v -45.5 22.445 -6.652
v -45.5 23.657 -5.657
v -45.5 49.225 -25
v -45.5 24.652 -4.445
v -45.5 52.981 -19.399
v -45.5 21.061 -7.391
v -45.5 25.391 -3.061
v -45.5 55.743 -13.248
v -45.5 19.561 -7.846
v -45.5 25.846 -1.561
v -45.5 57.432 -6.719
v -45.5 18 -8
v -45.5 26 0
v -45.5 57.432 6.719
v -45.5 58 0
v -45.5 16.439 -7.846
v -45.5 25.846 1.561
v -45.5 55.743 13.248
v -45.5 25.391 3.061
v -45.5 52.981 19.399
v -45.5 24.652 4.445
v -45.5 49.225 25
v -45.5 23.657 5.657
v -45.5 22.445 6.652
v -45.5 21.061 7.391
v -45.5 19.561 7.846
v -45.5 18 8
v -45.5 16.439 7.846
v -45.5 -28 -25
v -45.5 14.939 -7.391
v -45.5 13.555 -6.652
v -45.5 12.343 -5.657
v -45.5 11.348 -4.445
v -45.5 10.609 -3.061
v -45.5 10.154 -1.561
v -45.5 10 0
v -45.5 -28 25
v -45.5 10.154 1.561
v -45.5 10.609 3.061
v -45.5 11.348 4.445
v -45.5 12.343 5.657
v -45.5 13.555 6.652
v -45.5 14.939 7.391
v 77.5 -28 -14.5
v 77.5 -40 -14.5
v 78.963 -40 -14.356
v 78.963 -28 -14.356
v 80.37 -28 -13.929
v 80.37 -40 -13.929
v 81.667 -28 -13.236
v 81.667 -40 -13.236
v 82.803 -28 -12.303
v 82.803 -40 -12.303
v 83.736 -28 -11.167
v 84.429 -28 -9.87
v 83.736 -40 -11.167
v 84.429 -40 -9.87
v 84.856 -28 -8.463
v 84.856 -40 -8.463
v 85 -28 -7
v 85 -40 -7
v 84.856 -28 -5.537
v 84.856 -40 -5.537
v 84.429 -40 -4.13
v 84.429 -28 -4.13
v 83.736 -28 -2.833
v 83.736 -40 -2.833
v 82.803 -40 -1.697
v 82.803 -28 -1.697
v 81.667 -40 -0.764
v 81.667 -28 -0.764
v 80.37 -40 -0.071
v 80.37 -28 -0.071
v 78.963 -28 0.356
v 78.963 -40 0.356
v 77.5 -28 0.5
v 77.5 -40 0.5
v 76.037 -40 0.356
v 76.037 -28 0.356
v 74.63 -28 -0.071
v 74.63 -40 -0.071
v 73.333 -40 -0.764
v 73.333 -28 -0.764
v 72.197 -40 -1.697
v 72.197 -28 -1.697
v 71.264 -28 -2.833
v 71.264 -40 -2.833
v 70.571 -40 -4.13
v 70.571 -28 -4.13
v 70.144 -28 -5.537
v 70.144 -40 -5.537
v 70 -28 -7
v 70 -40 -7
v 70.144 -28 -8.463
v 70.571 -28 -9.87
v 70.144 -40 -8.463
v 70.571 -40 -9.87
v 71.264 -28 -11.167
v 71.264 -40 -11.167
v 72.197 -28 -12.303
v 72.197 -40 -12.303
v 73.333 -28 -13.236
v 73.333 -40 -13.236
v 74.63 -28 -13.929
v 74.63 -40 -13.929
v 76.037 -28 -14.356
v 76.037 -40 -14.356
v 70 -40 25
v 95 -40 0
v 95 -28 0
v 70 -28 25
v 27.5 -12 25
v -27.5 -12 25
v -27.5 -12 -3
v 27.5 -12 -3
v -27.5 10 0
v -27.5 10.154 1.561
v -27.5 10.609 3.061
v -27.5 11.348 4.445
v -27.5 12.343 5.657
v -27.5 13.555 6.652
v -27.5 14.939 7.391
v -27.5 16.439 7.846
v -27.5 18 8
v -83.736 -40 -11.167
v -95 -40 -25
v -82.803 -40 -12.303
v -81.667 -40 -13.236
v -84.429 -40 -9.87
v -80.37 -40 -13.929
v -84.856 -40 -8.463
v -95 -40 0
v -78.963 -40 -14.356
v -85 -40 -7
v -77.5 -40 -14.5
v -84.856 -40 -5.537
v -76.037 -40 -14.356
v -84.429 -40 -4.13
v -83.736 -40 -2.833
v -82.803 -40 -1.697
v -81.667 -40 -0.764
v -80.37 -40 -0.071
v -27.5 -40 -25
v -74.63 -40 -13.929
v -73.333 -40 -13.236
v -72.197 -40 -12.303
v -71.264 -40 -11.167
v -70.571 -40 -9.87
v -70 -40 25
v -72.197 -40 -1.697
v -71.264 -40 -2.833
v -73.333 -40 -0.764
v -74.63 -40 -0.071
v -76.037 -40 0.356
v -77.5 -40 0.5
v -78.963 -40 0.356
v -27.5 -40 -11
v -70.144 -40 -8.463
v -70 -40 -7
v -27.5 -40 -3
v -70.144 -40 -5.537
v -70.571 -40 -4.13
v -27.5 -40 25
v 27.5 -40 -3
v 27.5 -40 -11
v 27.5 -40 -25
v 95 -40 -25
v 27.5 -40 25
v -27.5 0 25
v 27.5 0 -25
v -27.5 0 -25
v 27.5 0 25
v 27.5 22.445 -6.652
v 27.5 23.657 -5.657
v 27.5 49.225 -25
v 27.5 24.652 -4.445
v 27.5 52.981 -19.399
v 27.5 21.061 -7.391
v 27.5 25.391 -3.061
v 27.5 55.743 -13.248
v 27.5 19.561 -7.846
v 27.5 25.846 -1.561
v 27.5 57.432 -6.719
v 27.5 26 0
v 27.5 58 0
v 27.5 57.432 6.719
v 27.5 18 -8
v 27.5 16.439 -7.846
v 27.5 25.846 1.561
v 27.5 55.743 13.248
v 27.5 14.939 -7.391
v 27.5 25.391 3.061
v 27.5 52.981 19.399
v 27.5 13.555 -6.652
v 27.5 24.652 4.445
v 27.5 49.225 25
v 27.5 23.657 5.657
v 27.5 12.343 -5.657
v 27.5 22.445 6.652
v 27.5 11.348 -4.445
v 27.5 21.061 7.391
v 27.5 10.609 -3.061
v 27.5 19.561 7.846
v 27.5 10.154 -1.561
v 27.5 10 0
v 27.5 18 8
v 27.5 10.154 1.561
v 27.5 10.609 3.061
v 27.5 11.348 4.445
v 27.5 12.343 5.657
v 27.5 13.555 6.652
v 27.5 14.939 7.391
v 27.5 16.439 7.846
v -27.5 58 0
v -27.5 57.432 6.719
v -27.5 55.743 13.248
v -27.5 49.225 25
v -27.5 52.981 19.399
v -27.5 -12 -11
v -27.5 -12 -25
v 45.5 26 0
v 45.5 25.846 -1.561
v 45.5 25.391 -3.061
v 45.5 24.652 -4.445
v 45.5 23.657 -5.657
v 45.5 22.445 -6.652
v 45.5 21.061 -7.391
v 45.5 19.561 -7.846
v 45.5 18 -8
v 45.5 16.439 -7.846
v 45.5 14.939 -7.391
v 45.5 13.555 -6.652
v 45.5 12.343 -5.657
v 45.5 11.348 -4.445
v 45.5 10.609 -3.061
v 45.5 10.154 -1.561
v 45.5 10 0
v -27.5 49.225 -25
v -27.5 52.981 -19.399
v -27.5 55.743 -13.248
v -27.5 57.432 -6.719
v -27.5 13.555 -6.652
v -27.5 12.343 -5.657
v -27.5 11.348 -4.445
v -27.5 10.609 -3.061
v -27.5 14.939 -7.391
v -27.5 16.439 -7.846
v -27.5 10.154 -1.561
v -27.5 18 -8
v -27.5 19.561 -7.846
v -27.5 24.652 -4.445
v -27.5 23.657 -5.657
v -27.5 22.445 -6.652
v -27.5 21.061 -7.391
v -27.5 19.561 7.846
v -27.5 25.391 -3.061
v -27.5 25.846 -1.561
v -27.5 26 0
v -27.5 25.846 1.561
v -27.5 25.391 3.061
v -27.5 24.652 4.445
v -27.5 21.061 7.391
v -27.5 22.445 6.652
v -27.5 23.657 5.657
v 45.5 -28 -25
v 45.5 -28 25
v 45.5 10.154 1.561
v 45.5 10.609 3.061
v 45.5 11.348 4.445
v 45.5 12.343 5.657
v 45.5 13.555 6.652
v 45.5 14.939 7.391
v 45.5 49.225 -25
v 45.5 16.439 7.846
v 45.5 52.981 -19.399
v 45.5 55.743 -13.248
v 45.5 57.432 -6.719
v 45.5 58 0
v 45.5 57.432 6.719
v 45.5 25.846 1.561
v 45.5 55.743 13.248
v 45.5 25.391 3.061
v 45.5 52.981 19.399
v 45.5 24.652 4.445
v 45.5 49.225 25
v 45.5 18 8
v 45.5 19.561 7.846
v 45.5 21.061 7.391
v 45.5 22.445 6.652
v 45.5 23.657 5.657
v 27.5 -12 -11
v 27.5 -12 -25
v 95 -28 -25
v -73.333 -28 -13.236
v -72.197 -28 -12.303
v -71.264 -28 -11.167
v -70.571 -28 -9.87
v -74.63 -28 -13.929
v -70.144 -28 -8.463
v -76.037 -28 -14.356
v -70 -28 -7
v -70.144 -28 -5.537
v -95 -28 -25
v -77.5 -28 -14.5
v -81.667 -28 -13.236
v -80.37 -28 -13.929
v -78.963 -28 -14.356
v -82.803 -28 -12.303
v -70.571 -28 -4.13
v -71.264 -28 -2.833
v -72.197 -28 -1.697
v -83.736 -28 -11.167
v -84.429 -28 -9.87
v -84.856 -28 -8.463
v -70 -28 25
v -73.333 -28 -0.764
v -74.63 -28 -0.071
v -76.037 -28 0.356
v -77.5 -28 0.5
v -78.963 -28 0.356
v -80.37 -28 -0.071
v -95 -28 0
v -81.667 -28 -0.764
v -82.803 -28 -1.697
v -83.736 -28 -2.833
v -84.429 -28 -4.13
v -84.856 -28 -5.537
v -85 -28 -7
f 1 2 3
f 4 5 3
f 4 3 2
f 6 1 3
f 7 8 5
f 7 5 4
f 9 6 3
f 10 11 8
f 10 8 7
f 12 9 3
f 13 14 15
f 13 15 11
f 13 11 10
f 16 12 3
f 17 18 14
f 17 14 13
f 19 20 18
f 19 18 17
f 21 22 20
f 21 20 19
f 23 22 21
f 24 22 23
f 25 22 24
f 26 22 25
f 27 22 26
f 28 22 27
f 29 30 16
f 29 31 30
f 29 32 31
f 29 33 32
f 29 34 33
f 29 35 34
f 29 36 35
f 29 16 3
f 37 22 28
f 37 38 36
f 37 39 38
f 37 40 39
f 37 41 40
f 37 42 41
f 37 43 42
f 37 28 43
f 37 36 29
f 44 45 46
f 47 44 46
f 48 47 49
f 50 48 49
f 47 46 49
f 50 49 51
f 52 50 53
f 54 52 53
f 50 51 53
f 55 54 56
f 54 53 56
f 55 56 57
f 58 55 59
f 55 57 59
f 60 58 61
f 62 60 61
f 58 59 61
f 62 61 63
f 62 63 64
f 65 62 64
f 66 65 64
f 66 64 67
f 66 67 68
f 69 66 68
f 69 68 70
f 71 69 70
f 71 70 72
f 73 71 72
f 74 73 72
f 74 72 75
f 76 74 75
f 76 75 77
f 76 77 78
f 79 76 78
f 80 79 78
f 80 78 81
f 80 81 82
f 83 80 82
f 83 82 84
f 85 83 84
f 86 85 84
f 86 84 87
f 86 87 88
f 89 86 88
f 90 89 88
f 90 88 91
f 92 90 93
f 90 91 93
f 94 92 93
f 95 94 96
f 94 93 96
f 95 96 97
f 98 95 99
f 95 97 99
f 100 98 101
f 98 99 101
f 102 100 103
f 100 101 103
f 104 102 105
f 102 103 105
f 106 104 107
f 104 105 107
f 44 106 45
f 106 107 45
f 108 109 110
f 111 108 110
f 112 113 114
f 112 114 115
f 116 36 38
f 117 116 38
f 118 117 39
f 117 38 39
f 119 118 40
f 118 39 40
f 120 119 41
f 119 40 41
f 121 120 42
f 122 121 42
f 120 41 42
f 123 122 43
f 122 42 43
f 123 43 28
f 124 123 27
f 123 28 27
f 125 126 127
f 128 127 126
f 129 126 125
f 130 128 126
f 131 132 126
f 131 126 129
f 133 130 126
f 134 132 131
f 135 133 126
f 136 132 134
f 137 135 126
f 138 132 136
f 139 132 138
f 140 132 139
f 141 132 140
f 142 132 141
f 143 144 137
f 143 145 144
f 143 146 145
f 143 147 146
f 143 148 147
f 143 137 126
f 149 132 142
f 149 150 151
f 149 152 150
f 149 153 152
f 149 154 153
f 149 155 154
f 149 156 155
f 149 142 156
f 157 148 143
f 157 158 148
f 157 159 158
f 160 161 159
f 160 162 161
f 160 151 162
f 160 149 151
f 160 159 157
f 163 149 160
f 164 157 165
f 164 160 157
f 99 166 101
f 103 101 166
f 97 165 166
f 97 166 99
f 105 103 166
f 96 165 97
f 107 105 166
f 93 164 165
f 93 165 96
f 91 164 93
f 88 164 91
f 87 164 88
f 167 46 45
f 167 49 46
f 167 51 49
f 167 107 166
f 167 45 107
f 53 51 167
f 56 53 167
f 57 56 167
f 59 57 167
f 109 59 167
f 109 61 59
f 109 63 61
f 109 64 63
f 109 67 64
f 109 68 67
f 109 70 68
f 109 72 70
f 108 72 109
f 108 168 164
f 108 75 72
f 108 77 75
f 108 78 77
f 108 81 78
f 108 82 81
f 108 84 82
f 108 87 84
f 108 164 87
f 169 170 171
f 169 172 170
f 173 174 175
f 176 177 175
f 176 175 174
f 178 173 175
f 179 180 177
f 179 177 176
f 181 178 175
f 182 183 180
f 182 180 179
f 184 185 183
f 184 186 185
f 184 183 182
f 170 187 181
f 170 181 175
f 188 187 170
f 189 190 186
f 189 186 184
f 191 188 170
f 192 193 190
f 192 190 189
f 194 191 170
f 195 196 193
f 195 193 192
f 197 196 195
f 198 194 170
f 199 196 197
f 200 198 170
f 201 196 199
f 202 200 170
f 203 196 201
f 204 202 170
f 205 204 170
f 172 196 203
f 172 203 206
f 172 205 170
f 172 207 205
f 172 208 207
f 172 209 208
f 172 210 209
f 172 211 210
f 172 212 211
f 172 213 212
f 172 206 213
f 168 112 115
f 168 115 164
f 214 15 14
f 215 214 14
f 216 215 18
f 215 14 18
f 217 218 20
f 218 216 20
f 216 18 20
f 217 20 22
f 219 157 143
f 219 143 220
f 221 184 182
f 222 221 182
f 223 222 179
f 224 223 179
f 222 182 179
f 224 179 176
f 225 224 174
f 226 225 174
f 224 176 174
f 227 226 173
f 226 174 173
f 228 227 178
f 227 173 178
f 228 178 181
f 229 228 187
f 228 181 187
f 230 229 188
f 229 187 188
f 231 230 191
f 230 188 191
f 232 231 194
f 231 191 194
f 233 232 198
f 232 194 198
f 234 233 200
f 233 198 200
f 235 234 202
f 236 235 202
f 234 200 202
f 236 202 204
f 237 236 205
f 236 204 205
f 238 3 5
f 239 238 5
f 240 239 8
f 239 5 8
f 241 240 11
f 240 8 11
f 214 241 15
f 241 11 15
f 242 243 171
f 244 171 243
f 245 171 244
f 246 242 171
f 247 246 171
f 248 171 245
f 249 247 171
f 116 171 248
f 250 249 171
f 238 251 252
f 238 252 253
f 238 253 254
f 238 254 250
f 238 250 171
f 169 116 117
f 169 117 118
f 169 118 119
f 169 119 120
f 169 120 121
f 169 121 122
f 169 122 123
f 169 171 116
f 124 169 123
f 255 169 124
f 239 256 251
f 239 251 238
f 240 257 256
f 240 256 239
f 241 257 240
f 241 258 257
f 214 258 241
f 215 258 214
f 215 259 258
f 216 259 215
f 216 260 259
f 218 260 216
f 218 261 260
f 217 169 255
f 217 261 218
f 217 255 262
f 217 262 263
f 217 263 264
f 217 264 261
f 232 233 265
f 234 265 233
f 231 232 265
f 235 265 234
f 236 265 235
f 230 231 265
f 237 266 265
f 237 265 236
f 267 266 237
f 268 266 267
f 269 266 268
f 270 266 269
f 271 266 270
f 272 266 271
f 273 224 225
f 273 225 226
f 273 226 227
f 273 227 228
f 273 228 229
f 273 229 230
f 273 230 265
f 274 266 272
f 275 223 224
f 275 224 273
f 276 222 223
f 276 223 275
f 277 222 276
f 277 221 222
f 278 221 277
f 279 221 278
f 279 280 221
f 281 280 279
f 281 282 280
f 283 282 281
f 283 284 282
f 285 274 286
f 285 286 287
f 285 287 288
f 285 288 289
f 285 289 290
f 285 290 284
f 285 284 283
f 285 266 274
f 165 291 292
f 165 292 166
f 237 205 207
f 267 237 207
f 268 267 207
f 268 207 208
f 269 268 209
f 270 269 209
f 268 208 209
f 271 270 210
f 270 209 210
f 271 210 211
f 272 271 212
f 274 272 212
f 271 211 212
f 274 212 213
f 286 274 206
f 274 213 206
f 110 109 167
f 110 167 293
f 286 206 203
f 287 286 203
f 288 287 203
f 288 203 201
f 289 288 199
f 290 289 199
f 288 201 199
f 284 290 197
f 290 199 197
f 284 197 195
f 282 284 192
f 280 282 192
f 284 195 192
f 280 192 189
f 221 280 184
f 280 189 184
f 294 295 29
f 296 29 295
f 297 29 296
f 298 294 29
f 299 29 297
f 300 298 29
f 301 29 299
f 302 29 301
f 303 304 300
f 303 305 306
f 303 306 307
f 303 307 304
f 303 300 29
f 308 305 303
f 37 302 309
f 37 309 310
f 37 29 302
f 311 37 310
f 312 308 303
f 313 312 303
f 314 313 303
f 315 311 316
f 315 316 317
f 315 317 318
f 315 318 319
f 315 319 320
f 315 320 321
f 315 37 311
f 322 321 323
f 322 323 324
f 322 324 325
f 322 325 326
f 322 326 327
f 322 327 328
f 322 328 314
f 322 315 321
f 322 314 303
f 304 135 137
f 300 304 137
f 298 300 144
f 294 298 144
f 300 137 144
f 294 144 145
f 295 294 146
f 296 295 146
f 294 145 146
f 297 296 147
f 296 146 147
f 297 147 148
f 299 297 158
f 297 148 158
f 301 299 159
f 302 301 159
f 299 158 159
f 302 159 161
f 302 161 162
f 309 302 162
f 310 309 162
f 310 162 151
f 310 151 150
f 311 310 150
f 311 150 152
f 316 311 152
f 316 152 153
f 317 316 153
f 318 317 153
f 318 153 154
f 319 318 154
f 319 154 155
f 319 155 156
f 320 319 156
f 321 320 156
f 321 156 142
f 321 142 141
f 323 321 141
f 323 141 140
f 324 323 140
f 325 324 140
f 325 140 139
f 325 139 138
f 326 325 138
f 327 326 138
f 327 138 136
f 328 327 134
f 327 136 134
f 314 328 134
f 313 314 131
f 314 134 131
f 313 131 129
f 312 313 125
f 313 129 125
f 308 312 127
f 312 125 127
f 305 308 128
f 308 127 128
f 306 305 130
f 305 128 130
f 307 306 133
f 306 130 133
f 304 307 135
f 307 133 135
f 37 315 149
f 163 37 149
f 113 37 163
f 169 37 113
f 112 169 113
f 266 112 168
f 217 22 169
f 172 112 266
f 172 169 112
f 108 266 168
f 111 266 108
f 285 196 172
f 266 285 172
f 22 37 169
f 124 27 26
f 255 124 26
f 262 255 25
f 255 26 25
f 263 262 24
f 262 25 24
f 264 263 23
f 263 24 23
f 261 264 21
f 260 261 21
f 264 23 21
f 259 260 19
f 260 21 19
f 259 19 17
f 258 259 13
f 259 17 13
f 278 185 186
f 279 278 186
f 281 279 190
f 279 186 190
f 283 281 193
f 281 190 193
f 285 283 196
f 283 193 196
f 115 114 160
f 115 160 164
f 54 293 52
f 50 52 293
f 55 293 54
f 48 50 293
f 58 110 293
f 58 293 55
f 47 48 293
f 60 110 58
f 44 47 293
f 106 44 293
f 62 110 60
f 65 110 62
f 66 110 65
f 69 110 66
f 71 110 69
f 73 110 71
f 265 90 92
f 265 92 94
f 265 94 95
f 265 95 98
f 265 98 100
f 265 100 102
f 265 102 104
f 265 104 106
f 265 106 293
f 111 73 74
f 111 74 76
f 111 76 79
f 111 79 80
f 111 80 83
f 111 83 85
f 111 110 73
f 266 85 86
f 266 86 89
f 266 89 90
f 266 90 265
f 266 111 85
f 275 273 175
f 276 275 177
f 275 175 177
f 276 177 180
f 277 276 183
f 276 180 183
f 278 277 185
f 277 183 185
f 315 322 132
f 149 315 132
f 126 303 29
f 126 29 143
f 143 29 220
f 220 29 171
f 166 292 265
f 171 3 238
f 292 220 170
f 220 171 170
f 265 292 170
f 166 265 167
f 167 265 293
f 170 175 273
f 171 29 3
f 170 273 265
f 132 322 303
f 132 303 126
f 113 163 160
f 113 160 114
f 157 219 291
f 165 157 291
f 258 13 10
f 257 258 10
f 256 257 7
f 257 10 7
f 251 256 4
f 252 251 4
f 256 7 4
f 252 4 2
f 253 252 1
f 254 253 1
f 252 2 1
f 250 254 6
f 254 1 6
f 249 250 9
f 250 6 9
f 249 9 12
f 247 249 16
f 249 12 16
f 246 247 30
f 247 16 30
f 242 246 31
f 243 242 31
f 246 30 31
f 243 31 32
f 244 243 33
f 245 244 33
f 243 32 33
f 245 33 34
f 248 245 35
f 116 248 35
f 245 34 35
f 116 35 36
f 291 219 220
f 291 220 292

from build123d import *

# Parameters (mm, degrees)
BOSS_EXTRUDE1_DEPTH = 25
RIB1_START          = -28
RIB1_OUTLINE_W      = 55
RIB1_OUTLINE_H      = 8
RIB1_DEPTH          = 28
CUT_EXTRUDE1_DEPTH  = 100
SKETCH2_5_R         = 7.5
CUT_EXTRUDE2_DEPTH  = 20
CHAMFER2_SIZE       = 25


# Read off the part's stored shape, not the designer's step: Rib1
with BuildPart() as part:
    # Sketch1 → Boss-Extrude1 (new, symmetric)
    with BuildSketch(Plane.XY):
        Polygon((27.5, 0), (0, 0), (0, -12), (27.5, -12), (27.5, -40), (95, -40), (95, -28), (45.5, -28), (45.5, 58), (27.5, 58), align=None)
        Polygon((0, -12), (0, 0), (-27.5, 0), (-27.5, 58), (-45.5, 58), (-45.5, -28), (-95, -28), (-95, -40), (-27.5, -40), (-27.5, -12), align=None)
    extrude(amount=BOSS_EXTRUDE1_DEPTH, both=True)

    # Rib1 outline → Rib1 (add)
    with BuildSketch(Plane.XZ.offset(40).offset(RIB1_START)):
        with Locations((0, -7)):
            Rectangle(RIB1_OUTLINE_W, RIB1_OUTLINE_H)
    extrude(amount=RIB1_DEPTH)

    # Sketch4 → Cut-Extrude1 (cut)
    with BuildSketch(Plane.ZY.offset(45.5)):
        with BuildLine():
            ThreePointArc((8, 18), (5.656854249, 23.656854249), (0, 26))
            Line((0, 26), (0, 10))
            ThreePointArc((0, 10), (5.656854249, 12.343145751), (8, 18))
        make_face()
        with BuildLine():
            Line((0, 10), (0, 26))
            ThreePointArc((0, 26), (-8, 18), (0, 10))
        make_face()
        with BuildLine():
            Line((25, 49.224989992), (25, 58))
            Line((25, 58), (-1.3e-08, 58))
            ThreePointArc((-1.3e-08, 58), (13.247648848, 55.742546284), (25, 49.224989992))
        make_face()
        with BuildLine():
            ThreePointArc((-25, 49.224989992), (-13.24764886, 55.74254628), (-1.3e-08, 58))
            Line((-1.3e-08, 58), (-25, 58))
            Line((-25, 58), (-25, 49.224989992))
        make_face()
    extrude(amount=-CUT_EXTRUDE1_DEPTH, mode=Mode.SUBTRACT)

    # Sketch2<5> → Cut-Extrude2 (cut)
    with BuildSketch(Plane.XZ.offset(40)):
        with Locations(Location((-77.5, -7, 0), (0, 0, 270))):
            Circle(SKETCH2_5_R)
        with Locations(Location((77.5, -7, 0), (0, 0, 270))):
            Circle(SKETCH2_5_R)
    extrude(amount=-CUT_EXTRUDE2_DEPTH, mode=Mode.SUBTRACT)

    # Chamfer2
    chamfer2_edges = [part.edges().sort_by_distance(p)[0] for p in [
        (-95, -34, 25),
        (95, -34, 25),
    ]]
    chamfer(chamfer2_edges, length=CHAMFER2_SIZE)


solid = part.part
